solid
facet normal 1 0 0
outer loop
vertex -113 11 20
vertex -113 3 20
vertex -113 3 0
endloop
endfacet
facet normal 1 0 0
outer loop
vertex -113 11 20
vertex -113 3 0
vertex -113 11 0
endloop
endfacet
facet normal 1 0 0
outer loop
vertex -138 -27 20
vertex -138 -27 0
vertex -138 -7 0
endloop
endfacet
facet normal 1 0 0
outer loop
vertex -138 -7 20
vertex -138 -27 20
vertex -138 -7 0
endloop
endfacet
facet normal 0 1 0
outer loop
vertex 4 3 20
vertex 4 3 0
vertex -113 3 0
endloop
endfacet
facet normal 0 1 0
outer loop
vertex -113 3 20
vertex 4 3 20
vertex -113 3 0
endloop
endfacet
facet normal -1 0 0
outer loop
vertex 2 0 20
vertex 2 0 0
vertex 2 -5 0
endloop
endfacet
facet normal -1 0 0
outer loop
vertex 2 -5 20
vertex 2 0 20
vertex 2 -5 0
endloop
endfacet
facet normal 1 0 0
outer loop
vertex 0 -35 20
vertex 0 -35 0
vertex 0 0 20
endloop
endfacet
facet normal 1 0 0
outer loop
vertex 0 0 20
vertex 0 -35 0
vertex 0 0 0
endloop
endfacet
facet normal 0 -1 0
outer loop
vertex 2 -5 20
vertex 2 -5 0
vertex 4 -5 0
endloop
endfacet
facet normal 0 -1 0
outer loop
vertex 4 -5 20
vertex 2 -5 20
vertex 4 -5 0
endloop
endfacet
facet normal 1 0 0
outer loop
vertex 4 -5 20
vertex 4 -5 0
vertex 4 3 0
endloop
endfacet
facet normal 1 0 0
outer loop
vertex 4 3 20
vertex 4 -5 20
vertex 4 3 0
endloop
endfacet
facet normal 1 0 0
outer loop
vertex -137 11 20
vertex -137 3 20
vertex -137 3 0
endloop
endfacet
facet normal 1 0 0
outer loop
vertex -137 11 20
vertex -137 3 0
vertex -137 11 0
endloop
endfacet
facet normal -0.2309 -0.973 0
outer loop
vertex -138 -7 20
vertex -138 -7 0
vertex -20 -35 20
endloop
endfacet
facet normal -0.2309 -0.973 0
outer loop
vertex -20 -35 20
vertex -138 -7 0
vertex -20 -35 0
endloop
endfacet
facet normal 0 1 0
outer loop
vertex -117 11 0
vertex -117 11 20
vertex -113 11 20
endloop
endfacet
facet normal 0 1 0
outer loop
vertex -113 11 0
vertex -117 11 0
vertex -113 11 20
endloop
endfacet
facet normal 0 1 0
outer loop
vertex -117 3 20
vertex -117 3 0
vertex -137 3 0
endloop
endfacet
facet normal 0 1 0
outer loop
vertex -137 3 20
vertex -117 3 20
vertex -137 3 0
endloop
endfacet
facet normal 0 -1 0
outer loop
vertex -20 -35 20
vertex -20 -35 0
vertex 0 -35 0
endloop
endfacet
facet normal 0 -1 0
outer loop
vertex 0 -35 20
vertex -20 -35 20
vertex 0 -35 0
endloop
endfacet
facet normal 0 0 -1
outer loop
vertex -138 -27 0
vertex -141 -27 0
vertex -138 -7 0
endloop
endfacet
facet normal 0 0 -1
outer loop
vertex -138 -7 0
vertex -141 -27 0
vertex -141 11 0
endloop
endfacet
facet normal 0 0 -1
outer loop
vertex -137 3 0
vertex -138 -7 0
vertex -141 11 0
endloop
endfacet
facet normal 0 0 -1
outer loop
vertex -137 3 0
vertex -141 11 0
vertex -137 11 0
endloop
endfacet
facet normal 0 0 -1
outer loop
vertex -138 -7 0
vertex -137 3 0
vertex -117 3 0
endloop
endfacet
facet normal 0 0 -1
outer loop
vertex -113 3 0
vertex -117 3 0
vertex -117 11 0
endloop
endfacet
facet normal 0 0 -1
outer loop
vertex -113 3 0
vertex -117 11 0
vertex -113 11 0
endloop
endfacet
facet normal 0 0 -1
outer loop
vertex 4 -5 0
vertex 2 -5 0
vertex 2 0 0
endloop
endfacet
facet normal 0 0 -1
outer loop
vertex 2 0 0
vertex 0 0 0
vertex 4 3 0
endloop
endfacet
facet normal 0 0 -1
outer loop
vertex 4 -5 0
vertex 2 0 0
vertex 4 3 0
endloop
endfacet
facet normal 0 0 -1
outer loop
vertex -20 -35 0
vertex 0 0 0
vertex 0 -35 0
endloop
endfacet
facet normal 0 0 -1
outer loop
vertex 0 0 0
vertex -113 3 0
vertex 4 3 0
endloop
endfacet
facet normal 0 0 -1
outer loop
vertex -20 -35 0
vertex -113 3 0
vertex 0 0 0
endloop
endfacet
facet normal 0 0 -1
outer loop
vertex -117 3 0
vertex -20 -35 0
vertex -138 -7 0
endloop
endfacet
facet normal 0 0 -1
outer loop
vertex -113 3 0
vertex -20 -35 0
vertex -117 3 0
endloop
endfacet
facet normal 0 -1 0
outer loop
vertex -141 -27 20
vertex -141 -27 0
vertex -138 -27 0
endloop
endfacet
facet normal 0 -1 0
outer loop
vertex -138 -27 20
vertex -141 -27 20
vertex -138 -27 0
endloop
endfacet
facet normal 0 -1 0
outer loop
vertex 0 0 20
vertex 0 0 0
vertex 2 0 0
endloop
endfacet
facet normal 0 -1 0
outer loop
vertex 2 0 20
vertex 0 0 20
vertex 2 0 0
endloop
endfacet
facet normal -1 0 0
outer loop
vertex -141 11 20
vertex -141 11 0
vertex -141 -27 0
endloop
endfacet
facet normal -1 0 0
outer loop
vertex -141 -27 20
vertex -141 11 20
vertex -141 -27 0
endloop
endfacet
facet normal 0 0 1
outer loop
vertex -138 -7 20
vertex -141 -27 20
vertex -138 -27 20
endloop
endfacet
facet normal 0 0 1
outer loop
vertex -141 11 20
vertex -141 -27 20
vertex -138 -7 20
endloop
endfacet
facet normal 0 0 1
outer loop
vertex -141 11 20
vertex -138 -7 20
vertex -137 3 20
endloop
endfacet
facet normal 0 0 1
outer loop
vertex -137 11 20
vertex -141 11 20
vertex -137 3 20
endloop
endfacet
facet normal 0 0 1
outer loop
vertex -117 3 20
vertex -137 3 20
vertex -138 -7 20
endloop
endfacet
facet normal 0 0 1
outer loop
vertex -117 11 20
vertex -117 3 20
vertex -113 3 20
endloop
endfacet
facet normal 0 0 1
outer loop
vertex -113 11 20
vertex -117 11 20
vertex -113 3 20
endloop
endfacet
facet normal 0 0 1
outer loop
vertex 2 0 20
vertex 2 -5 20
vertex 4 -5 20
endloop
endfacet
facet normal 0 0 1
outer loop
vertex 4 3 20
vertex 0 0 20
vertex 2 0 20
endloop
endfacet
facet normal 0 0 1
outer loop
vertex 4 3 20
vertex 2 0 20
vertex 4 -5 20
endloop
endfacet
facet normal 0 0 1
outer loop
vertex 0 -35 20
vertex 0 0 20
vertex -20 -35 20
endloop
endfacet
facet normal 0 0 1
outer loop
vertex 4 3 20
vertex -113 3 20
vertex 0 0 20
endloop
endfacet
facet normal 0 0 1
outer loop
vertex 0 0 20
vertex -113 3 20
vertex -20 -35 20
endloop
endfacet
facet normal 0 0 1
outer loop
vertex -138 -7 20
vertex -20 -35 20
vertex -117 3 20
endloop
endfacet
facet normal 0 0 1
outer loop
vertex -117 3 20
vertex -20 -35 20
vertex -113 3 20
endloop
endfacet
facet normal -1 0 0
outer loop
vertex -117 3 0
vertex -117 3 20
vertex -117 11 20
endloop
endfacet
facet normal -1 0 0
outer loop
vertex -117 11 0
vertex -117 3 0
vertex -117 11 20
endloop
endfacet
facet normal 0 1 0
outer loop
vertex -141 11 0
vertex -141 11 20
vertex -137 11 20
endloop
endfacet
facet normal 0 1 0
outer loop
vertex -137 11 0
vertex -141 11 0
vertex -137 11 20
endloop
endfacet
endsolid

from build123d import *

# Parameters (mm, degrees)
F0_W     = 4
F0_H     = 8
F1_DEPTH = 20


with BuildPart() as f1:
    # F0 (on Top) → F1 (new body)
    with BuildSketch(Plane.XY):
        Polygon((-20, -35), (0, -35), (0, 0), (2, 0), (2, -5), (4, -5), (4, 3), (-113, 3), (-117, 3), (-137, 3), (-141, 3), (-141, -27), (-138, -27), (-138, -7), align=None)
        with Locations((-139, 7)):
            Rectangle(F0_W, F0_H)
        with Locations((-115, 7)):
            Rectangle(F0_W, F0_H)
    extrude(amount=F1_DEPTH)


solid = f1.part
